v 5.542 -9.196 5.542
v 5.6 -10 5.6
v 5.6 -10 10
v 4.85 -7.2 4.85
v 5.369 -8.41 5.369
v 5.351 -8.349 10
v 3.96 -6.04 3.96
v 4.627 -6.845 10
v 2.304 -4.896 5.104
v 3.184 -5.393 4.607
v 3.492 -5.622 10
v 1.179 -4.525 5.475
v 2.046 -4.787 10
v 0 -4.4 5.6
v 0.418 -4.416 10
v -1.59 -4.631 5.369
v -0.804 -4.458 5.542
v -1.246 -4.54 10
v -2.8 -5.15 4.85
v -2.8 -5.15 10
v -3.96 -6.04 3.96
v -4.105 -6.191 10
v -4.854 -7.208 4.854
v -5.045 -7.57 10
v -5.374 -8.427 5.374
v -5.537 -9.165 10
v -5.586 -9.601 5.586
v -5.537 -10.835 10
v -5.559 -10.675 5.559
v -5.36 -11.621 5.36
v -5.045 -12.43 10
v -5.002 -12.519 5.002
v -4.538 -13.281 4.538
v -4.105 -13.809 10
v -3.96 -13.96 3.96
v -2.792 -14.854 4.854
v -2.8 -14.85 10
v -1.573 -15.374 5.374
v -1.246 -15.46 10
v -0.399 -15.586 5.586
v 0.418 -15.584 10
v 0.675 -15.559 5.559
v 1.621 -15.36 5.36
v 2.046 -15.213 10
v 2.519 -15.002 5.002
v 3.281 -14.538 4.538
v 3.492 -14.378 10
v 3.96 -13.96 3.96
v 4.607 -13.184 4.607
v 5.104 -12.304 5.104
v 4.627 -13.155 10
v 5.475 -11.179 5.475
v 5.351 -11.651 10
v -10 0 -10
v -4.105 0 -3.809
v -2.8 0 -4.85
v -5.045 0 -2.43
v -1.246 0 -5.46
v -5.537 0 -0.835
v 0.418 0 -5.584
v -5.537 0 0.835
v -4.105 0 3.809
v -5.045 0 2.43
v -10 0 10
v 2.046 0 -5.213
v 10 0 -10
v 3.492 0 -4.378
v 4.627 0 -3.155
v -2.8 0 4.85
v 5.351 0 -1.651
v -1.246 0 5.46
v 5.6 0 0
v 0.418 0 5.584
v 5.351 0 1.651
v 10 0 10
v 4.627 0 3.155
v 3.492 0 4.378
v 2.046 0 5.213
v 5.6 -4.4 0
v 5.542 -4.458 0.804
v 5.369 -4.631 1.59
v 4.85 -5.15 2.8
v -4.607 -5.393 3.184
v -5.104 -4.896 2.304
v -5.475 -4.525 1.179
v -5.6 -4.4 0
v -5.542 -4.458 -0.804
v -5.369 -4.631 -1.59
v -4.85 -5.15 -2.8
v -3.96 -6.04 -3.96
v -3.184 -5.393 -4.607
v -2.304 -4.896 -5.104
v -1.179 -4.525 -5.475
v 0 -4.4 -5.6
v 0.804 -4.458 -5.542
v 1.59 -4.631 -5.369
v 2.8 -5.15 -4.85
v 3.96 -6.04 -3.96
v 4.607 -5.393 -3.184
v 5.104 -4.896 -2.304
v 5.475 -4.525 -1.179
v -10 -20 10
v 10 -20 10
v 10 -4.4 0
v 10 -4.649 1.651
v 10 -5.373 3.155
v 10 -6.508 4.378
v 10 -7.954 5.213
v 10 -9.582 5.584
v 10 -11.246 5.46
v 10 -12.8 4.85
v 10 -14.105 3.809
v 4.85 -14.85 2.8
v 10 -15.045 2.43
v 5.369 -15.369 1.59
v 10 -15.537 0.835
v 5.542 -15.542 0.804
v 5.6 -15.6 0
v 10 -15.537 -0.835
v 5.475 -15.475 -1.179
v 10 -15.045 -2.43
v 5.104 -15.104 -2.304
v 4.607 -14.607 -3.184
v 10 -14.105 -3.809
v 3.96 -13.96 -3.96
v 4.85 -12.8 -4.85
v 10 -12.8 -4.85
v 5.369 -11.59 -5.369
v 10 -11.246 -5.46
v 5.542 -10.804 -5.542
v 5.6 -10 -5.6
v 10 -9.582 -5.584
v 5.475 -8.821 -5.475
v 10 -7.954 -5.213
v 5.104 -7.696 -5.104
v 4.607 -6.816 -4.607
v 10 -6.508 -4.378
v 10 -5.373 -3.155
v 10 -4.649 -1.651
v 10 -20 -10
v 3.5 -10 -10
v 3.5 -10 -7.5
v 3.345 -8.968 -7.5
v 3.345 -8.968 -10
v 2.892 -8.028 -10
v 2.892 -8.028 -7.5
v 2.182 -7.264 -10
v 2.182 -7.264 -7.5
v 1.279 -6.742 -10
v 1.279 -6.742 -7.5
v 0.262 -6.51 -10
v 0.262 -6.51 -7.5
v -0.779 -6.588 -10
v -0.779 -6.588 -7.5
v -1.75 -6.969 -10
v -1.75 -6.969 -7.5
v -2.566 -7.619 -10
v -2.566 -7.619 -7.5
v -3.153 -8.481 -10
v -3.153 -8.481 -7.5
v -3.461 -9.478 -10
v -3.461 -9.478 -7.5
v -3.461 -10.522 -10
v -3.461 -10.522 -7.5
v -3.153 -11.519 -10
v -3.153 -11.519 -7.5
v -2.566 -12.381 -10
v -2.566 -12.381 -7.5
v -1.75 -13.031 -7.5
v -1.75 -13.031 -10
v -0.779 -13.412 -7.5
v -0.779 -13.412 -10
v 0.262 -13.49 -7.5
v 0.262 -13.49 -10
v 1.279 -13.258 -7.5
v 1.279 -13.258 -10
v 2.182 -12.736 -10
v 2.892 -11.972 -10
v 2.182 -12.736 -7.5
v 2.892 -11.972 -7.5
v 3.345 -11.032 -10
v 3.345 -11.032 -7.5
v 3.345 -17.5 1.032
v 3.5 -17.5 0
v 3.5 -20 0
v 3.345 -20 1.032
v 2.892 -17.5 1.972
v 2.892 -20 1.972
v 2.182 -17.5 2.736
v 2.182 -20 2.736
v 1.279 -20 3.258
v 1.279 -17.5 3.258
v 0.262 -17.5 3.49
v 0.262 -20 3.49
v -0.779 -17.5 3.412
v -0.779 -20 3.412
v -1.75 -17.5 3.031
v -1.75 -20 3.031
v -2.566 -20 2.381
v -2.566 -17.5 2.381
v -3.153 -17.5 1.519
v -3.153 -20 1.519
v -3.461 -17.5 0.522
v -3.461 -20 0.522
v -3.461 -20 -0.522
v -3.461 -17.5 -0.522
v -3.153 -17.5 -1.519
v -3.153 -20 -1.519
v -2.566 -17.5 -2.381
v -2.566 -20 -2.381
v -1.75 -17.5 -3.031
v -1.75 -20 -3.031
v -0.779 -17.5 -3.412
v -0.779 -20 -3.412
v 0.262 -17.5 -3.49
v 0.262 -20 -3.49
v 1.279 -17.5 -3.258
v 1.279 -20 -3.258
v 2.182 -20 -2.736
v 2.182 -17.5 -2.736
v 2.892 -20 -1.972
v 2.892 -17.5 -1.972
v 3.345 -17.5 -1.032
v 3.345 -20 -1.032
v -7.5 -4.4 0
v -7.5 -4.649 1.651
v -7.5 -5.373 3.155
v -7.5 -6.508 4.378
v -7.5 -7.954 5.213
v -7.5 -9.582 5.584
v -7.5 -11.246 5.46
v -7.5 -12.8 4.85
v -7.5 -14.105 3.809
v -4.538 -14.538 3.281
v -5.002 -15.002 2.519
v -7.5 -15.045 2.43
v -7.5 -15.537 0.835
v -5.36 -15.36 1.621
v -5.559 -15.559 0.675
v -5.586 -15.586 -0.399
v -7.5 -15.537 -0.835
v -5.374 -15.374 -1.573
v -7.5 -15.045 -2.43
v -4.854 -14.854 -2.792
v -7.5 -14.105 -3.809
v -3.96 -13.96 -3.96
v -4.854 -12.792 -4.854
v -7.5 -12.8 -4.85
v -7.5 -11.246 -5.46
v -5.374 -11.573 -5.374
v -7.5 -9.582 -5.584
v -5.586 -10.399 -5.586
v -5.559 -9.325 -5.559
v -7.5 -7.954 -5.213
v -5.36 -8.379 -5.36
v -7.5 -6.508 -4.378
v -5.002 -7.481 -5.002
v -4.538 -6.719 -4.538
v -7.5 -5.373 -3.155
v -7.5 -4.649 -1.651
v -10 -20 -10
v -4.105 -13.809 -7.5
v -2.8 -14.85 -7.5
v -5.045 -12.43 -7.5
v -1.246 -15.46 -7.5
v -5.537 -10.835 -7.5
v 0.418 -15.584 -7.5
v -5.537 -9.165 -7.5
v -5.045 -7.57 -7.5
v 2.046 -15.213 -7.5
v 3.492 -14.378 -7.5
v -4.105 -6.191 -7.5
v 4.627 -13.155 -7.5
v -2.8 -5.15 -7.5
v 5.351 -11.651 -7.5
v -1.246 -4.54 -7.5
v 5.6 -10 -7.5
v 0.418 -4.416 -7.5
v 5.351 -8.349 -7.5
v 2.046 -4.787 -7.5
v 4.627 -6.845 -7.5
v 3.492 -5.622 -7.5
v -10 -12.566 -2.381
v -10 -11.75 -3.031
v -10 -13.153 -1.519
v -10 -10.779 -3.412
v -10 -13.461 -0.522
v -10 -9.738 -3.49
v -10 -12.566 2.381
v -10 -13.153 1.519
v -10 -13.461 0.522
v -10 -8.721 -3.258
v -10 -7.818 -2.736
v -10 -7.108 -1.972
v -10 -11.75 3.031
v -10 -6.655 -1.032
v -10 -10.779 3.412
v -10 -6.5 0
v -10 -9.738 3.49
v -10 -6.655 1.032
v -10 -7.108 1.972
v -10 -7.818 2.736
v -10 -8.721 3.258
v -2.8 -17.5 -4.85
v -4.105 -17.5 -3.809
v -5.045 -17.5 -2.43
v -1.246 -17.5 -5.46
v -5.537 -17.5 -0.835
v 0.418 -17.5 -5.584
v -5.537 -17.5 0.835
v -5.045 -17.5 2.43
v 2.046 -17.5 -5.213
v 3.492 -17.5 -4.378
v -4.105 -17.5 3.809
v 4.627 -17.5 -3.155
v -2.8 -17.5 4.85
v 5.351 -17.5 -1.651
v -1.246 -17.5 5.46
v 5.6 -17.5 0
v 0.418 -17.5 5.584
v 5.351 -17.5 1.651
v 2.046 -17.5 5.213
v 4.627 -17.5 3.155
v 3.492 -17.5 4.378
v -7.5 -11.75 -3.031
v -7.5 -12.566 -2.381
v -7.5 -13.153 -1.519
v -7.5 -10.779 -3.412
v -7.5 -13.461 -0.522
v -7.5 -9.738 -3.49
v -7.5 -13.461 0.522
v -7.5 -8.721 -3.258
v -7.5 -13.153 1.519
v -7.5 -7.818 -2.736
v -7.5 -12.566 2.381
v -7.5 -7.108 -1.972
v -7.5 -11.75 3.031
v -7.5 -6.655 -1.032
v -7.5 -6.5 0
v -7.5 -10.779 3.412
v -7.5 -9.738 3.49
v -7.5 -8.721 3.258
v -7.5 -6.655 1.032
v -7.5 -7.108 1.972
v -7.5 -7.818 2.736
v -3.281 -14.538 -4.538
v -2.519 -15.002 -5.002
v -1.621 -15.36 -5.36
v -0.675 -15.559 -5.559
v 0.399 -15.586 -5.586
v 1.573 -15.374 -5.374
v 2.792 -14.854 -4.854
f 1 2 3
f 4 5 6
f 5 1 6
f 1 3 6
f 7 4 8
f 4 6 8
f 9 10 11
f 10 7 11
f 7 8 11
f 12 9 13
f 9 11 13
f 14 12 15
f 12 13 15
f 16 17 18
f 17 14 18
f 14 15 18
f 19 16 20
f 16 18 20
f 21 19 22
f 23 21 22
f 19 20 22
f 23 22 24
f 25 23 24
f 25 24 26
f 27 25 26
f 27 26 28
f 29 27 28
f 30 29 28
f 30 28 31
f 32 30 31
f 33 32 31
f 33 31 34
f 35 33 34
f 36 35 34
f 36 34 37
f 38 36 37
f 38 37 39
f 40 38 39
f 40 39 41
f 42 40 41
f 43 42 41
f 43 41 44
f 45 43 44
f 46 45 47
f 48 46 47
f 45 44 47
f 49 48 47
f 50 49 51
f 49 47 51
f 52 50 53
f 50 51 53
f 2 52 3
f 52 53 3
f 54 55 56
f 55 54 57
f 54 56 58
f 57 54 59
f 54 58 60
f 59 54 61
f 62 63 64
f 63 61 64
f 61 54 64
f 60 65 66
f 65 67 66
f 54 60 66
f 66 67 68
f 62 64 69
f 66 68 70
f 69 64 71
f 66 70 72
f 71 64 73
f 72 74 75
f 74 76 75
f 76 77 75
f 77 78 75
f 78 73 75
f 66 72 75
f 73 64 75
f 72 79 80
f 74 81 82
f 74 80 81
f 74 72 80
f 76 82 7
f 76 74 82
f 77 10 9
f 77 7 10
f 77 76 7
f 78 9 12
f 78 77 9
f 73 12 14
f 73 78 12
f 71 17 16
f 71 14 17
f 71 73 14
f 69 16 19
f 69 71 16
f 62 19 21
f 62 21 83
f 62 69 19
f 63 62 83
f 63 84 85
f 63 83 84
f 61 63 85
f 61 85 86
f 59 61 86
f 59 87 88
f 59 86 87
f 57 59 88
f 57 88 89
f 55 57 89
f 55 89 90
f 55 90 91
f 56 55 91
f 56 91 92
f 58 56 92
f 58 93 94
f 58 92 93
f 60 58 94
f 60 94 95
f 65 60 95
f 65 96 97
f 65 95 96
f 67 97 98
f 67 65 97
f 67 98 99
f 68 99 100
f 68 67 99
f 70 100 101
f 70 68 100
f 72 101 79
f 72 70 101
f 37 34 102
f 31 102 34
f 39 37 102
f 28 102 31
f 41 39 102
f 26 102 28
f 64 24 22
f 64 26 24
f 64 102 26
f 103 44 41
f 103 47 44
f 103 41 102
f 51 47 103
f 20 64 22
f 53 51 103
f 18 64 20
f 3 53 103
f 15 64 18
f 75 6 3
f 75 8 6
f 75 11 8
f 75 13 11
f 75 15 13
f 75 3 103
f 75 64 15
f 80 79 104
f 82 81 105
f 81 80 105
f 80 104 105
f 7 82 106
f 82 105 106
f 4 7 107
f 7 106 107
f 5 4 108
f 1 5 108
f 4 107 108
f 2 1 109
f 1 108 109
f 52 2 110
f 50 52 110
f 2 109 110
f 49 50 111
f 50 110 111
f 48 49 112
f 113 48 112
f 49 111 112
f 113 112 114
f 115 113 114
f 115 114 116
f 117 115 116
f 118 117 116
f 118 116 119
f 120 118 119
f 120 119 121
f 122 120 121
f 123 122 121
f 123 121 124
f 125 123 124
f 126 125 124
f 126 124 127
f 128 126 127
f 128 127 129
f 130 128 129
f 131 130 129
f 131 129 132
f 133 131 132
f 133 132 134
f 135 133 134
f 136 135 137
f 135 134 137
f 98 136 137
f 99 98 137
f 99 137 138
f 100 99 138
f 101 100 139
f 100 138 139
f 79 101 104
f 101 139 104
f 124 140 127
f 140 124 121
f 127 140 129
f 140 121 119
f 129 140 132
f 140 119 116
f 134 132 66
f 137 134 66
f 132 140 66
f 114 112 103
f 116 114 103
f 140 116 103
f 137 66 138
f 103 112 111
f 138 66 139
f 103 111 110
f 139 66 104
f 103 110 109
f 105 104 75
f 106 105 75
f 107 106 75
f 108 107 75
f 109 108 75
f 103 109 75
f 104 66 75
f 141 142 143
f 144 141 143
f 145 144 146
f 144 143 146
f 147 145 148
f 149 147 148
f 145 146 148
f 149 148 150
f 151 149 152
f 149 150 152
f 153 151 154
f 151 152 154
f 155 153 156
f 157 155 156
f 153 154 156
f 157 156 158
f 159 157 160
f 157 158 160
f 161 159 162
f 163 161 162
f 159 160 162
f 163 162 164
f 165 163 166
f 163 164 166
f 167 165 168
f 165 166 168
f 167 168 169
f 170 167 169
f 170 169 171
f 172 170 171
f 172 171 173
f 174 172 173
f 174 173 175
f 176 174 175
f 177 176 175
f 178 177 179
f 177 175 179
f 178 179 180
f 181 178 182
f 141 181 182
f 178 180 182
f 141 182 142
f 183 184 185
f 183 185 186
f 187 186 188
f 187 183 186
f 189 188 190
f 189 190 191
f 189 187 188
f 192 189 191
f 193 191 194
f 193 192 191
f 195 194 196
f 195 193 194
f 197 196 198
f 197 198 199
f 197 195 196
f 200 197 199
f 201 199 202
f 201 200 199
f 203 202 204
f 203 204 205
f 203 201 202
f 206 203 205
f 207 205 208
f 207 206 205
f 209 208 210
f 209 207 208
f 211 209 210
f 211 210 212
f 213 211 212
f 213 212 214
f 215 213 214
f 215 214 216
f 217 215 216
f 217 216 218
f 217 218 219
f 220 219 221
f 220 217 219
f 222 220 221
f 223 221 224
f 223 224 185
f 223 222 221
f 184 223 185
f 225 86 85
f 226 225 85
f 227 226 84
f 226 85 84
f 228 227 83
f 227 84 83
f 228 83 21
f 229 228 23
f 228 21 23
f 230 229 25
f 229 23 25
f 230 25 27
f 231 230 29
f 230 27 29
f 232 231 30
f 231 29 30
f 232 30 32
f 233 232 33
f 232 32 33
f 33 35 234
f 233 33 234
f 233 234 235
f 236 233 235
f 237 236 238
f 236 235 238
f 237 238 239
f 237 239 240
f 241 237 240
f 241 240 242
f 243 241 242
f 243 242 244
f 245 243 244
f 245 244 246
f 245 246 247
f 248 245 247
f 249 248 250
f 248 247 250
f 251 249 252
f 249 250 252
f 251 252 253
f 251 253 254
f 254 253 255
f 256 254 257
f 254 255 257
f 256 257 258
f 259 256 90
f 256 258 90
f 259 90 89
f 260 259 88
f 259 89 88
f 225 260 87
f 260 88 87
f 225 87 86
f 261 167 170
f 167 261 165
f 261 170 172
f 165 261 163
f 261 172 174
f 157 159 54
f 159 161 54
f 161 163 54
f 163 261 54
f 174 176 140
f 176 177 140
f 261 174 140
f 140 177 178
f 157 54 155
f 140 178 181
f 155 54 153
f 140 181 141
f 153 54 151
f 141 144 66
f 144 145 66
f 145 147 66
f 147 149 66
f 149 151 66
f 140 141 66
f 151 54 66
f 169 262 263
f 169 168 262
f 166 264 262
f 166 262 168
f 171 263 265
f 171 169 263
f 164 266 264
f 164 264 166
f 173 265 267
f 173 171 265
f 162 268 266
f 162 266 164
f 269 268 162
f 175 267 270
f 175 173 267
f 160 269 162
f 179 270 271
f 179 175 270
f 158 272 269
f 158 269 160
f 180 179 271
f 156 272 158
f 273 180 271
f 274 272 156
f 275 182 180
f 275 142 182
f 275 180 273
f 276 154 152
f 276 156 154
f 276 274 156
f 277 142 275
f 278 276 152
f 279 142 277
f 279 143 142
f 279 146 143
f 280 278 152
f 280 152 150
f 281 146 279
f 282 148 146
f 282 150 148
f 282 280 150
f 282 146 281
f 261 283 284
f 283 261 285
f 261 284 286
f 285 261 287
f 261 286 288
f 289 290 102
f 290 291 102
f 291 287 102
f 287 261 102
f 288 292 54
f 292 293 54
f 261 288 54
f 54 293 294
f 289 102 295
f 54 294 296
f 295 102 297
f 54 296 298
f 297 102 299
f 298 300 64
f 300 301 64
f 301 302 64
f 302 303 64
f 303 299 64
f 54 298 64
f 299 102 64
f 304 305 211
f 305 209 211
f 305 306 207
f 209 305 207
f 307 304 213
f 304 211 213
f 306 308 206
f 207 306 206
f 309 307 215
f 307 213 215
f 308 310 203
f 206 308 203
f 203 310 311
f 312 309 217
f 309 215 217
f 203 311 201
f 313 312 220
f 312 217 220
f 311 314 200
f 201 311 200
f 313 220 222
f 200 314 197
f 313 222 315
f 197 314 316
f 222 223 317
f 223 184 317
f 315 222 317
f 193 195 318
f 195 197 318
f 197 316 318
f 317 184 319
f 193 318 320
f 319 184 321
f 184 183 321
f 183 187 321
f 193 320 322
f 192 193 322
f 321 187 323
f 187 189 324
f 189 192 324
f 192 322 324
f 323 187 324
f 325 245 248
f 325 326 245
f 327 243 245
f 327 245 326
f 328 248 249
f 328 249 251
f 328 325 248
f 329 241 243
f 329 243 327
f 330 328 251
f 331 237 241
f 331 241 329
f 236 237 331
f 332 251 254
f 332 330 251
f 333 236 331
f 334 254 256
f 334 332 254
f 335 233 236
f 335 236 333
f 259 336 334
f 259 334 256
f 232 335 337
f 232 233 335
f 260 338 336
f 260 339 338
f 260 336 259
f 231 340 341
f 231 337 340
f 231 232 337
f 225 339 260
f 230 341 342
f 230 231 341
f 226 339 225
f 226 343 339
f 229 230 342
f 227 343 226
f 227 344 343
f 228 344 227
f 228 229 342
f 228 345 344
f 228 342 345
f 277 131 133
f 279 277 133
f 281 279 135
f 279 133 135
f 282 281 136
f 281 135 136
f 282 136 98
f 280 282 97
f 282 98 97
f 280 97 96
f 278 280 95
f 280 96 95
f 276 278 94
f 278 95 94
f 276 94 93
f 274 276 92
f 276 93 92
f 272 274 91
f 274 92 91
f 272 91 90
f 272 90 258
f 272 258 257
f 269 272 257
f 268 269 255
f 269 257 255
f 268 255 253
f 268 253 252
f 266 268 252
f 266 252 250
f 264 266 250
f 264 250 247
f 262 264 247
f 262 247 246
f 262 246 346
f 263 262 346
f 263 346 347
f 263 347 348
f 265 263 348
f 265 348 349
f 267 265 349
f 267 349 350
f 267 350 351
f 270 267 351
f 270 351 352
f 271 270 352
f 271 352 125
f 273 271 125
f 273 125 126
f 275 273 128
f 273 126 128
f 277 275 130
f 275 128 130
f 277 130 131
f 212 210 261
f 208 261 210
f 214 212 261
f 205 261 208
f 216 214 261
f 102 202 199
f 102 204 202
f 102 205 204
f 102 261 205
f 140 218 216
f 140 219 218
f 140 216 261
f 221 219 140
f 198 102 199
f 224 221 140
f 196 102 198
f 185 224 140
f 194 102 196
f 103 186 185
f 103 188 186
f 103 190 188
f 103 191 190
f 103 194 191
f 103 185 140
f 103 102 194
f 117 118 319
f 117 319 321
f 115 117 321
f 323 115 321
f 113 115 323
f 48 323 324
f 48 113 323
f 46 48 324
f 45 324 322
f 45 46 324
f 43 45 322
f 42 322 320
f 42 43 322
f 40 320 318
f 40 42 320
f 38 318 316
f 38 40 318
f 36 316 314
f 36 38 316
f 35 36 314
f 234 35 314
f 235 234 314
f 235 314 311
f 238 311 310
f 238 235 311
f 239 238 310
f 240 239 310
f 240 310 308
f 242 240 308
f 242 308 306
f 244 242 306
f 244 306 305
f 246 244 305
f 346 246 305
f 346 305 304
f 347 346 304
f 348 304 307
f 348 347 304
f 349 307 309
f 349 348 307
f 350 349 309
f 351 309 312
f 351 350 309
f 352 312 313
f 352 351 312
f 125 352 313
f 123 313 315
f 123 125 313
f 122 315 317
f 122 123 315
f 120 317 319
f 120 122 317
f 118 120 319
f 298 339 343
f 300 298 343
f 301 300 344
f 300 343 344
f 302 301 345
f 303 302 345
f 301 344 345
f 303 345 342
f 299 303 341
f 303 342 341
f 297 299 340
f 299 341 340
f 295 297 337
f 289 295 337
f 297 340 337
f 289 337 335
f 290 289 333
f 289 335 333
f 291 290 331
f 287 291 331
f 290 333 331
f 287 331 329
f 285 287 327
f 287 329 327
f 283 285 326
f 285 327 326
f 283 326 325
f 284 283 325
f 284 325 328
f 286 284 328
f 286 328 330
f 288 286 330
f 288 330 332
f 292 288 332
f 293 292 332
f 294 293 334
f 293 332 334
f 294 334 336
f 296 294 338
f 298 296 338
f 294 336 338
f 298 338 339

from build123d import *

# Parameters (mm, degrees)
F0_W     = 20
F0_H     = 20
F0_R     = 5.6
F1_DEPTH = 20
F2_START = 17.5
F0_R_2   = 3.5
F2_DEPTH = 2.5
F3_R     = 5.6
F3_R_2   = 3.5
F4_DEPTH = 25
F5_START = -17.5
F5_DEPTH = 2.5
F6_R     = 5.6
F6_R_2   = 3.5
F7_DEPTH = 25
F8_START = -17.5
F8_DEPTH = 2.5


with BuildPart() as f1:
    # F0 (on Front) → F1 (new body)
    with BuildSketch(Plane.XZ):
        Rectangle(F0_W, F0_H)
        Circle(F0_R, mode=Mode.SUBTRACT)
    extrude(amount=F1_DEPTH)

    # F0 (on Front) → F2 (join)
    with BuildSketch(Plane.XZ.offset(F2_START)):
        Circle(F0_R)
        Circle(F0_R_2, mode=Mode.SUBTRACT)
    extrude(amount=F2_DEPTH)

    # F3 (on face) → F4 (cut)
    with BuildSketch(Plane.YZ.offset(10)):
        with Locations((-10, 0)):
            Circle(F3_R)
        with Locations((-10, 0)):
            Circle(F3_R_2, mode=Mode.SUBTRACT)
        with Locations((-10, 0)):
            Circle(F3_R_2)
    extrude(amount=-F4_DEPTH, mode=Mode.SUBTRACT)

    # F3 (on face) → F5 (join)
    with BuildSketch(Plane.YZ.offset(10).offset(F5_START)):
        with Locations((-10, 0)):
            Circle(F3_R)
        with Locations((-10, 0)):
            Circle(F3_R_2, mode=Mode.SUBTRACT)
    extrude(amount=-F5_DEPTH)

    # F6 (on face) → F7 (cut)
    with BuildSketch(Plane.XY.offset(10)):
        with Locations((0, -10)):
            Circle(F6_R)
        with Locations((0, -10)):
            Circle(F6_R_2, mode=Mode.SUBTRACT)
        with Locations((0, -10)):
            Circle(F6_R_2)
    extrude(amount=-F7_DEPTH, mode=Mode.SUBTRACT)

    # F6 (on face) → F8 (join)
    with BuildSketch(Plane.XY.offset(10).offset(F8_START)):
        with Locations((0, -10)):
            Circle(F6_R)
        with Locations((0, -10)):
            Circle(F6_R_2, mode=Mode.SUBTRACT)
    extrude(amount=-F8_DEPTH)


solid = f1.part
